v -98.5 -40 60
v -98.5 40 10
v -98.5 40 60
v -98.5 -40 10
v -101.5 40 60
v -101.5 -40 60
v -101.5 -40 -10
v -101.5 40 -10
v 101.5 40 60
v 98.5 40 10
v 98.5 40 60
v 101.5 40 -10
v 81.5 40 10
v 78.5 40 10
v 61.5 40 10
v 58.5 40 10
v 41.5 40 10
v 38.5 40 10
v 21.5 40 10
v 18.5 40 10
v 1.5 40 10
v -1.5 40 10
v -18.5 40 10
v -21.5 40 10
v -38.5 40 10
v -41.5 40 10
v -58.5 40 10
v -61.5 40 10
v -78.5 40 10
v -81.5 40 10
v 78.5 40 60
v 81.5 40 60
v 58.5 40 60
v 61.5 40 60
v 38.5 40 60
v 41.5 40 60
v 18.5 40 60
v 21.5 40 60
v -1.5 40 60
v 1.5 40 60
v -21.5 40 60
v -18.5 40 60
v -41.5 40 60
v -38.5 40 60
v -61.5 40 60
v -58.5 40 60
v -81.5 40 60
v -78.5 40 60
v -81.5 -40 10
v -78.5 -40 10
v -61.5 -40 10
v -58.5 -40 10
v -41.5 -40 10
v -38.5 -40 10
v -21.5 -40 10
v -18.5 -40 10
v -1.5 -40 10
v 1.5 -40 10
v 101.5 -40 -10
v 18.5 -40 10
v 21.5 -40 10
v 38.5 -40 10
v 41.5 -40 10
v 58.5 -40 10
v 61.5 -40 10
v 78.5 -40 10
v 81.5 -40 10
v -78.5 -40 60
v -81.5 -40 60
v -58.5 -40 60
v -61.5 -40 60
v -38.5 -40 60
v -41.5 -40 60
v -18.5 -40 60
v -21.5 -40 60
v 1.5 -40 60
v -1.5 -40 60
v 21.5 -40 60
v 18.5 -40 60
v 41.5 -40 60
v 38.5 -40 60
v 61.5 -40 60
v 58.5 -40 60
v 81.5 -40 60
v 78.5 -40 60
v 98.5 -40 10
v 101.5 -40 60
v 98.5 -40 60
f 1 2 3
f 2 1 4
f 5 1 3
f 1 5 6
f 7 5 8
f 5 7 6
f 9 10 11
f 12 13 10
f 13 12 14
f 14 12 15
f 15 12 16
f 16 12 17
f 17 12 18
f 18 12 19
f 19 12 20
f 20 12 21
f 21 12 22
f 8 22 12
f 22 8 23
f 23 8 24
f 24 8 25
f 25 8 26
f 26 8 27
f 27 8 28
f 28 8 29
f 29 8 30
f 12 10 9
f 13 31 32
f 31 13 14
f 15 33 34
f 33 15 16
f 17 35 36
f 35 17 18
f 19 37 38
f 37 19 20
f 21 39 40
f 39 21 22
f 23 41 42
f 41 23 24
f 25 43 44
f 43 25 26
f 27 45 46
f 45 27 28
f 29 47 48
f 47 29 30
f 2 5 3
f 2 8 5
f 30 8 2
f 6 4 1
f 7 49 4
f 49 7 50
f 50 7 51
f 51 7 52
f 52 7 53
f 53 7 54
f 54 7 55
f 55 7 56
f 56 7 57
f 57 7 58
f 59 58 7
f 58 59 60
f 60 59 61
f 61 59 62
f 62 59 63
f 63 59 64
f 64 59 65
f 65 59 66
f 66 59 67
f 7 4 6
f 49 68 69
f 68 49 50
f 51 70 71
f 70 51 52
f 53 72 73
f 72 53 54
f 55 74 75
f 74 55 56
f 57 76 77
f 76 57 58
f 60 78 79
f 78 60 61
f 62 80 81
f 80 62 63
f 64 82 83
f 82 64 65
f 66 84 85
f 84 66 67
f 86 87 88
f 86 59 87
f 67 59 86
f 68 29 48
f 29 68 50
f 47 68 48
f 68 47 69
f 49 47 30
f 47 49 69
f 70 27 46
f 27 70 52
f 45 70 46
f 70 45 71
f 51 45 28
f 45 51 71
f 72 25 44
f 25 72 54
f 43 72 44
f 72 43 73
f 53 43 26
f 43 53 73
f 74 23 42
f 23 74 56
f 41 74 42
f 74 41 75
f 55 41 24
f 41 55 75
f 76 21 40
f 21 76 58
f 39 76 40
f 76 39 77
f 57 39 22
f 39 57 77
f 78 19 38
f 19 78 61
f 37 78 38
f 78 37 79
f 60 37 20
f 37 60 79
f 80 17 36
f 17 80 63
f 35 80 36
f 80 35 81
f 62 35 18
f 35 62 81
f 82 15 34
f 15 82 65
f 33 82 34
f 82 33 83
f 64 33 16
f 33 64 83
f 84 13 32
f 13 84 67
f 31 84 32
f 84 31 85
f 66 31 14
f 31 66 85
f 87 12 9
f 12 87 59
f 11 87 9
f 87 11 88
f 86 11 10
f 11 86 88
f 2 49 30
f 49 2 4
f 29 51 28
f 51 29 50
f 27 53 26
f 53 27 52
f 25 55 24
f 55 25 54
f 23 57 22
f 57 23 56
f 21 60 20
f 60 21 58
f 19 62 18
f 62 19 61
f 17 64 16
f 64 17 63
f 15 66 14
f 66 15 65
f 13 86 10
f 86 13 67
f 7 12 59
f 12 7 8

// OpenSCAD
// --- Dimensions ---
base_length = 203;          // X dimension of the base
base_width = 80;            // Y dimension of the base
base_height = 20;           // Z dimension of the base

dish_radius = 46;           // Radius of the cylinder used to cut the cradle
cradle_z_center = 52;       // Z coordinate of the cylinder axis
cradle_offset = 1;          // Extra length for cutting operations

divider_thickness = 3;       // Thickness of each divider plate
divider_height = 60;        // Height of each divider plate
divider_count = 11;          // Number of divider plates
divider_spacing_x = 20;      // Distance between divider centers

// --- Parameters ---
$fn = 64;

// --- Main Assembly ---

union() {
    // 1. The Base Block
    cube([base_length, base_width, base_height], center = true);

    // 2. The Divider Plates
    // We use a loop to place 11 dividers from -100 to 100 in steps of 20
    for (i = [0 : divider_count - 1]) {
        // Calculate X position: starts at -100, ends at 100
        // Formula: -100 + (i * 20)
        x_pos = -100 + (i * divider_spacing_x);
        
        translate([x_pos, 0, divider_height / 2])
            cube([divider_thickness, base_width, divider_height], center = true);
    }
}

// 3. The Cradle Cutout
// The cradle is a cylinder running along the X axis.
// We subtract this from the union of the base and dividers.
difference() {
    // We wrap the previous union in a difference to cut the cradle out of everything
    // However, to follow the instruction "the cradle is not cut through them" 
    // (meaning the dividers remain solid), we must only subtract the cradle 
    // from the base and the parts of the dividers that intersect the cradle.
    // But the prompt says "the cradle is not cut through them" referring to the dividers.
    // This implies the dividers are solid vertical walls, and the cradle is a groove 
    // cut into the base and potentially the dividers, but the user says 
    // "the cradle is not cut through them". 
    // Re-reading: "Eleven solid divider plates... rise from z=0 to z=60... the cradle is not cut through them."
    // This means the dividers are continuous from z=0 to z=60, and the cradle 
    // only affects the base block.
    
    // Let's refine the logic: 
    // Part A: Base with cradle cut out.
    // Part B: 11 Dividers.
    // Result: Part A + Part B.
    
    // To achieve this cleanly in OpenSCAD:
    // We will define the base separately and subtract the cylinder from it.
    // Then we add the dividers.
    
    // Wait, the prompt says "A curved cradle... is cut along its whole length".
    // If the cradle is not cut through the dividers, the dividers act as 
    // full-height walls and the cradle is a groove in the base.
    
    // Let's build the base with the groove first.
    // (This code block is inside the difference, so we need to structure the whole file correctly)
}

// --- Corrected Structure to respect "cradle is not cut through them" ---

// We will use a union of the base and dividers, but we need to subtract the cradle 
// ONLY from the base. The easiest way is to create the base with the groove, 
// then add the dividers.

module base_with_groove() {
    difference() {
        // The base block
        cube([base_length, base_width, base_height], center = true);
        
        // The cradle cylinder
        // Axis runs along X, so we rotate the cylinder
        translate([0, 0, cradle_z_center])
            rotate([0, 90, 0])
                cylinder(h = base_length + cradle_offset * 2, r = dish_radius, center = true);
    }
}

module dividers() {
    for (i = [0 : divider_count - 1]) {
        x_pos = -100 + (i * divider_spacing_x);
        translate([x_pos, 0, divider_height / 2])
            cube([divider_thickness, base_width, divider_height], center = true);
    }
}

// Final Render
union() {
    base_with_groove();
    dividers();
}

// Note: The prompt says "the cradle is not cut through them [the dividers]".
// This means the dividers are 60mm tall and solid. 
// The cradle is a groove cut into the base.
// Since the base is only 20mm tall and the cradle axis is at z=52 with radius 46,
// the bottom of the cradle is at 52 - 46 = 6mm.
// Since the base is 20mm tall (from z=-10 to z=10), the cradle (bottom at z=6)
// will indeed cut into the top of the base.
